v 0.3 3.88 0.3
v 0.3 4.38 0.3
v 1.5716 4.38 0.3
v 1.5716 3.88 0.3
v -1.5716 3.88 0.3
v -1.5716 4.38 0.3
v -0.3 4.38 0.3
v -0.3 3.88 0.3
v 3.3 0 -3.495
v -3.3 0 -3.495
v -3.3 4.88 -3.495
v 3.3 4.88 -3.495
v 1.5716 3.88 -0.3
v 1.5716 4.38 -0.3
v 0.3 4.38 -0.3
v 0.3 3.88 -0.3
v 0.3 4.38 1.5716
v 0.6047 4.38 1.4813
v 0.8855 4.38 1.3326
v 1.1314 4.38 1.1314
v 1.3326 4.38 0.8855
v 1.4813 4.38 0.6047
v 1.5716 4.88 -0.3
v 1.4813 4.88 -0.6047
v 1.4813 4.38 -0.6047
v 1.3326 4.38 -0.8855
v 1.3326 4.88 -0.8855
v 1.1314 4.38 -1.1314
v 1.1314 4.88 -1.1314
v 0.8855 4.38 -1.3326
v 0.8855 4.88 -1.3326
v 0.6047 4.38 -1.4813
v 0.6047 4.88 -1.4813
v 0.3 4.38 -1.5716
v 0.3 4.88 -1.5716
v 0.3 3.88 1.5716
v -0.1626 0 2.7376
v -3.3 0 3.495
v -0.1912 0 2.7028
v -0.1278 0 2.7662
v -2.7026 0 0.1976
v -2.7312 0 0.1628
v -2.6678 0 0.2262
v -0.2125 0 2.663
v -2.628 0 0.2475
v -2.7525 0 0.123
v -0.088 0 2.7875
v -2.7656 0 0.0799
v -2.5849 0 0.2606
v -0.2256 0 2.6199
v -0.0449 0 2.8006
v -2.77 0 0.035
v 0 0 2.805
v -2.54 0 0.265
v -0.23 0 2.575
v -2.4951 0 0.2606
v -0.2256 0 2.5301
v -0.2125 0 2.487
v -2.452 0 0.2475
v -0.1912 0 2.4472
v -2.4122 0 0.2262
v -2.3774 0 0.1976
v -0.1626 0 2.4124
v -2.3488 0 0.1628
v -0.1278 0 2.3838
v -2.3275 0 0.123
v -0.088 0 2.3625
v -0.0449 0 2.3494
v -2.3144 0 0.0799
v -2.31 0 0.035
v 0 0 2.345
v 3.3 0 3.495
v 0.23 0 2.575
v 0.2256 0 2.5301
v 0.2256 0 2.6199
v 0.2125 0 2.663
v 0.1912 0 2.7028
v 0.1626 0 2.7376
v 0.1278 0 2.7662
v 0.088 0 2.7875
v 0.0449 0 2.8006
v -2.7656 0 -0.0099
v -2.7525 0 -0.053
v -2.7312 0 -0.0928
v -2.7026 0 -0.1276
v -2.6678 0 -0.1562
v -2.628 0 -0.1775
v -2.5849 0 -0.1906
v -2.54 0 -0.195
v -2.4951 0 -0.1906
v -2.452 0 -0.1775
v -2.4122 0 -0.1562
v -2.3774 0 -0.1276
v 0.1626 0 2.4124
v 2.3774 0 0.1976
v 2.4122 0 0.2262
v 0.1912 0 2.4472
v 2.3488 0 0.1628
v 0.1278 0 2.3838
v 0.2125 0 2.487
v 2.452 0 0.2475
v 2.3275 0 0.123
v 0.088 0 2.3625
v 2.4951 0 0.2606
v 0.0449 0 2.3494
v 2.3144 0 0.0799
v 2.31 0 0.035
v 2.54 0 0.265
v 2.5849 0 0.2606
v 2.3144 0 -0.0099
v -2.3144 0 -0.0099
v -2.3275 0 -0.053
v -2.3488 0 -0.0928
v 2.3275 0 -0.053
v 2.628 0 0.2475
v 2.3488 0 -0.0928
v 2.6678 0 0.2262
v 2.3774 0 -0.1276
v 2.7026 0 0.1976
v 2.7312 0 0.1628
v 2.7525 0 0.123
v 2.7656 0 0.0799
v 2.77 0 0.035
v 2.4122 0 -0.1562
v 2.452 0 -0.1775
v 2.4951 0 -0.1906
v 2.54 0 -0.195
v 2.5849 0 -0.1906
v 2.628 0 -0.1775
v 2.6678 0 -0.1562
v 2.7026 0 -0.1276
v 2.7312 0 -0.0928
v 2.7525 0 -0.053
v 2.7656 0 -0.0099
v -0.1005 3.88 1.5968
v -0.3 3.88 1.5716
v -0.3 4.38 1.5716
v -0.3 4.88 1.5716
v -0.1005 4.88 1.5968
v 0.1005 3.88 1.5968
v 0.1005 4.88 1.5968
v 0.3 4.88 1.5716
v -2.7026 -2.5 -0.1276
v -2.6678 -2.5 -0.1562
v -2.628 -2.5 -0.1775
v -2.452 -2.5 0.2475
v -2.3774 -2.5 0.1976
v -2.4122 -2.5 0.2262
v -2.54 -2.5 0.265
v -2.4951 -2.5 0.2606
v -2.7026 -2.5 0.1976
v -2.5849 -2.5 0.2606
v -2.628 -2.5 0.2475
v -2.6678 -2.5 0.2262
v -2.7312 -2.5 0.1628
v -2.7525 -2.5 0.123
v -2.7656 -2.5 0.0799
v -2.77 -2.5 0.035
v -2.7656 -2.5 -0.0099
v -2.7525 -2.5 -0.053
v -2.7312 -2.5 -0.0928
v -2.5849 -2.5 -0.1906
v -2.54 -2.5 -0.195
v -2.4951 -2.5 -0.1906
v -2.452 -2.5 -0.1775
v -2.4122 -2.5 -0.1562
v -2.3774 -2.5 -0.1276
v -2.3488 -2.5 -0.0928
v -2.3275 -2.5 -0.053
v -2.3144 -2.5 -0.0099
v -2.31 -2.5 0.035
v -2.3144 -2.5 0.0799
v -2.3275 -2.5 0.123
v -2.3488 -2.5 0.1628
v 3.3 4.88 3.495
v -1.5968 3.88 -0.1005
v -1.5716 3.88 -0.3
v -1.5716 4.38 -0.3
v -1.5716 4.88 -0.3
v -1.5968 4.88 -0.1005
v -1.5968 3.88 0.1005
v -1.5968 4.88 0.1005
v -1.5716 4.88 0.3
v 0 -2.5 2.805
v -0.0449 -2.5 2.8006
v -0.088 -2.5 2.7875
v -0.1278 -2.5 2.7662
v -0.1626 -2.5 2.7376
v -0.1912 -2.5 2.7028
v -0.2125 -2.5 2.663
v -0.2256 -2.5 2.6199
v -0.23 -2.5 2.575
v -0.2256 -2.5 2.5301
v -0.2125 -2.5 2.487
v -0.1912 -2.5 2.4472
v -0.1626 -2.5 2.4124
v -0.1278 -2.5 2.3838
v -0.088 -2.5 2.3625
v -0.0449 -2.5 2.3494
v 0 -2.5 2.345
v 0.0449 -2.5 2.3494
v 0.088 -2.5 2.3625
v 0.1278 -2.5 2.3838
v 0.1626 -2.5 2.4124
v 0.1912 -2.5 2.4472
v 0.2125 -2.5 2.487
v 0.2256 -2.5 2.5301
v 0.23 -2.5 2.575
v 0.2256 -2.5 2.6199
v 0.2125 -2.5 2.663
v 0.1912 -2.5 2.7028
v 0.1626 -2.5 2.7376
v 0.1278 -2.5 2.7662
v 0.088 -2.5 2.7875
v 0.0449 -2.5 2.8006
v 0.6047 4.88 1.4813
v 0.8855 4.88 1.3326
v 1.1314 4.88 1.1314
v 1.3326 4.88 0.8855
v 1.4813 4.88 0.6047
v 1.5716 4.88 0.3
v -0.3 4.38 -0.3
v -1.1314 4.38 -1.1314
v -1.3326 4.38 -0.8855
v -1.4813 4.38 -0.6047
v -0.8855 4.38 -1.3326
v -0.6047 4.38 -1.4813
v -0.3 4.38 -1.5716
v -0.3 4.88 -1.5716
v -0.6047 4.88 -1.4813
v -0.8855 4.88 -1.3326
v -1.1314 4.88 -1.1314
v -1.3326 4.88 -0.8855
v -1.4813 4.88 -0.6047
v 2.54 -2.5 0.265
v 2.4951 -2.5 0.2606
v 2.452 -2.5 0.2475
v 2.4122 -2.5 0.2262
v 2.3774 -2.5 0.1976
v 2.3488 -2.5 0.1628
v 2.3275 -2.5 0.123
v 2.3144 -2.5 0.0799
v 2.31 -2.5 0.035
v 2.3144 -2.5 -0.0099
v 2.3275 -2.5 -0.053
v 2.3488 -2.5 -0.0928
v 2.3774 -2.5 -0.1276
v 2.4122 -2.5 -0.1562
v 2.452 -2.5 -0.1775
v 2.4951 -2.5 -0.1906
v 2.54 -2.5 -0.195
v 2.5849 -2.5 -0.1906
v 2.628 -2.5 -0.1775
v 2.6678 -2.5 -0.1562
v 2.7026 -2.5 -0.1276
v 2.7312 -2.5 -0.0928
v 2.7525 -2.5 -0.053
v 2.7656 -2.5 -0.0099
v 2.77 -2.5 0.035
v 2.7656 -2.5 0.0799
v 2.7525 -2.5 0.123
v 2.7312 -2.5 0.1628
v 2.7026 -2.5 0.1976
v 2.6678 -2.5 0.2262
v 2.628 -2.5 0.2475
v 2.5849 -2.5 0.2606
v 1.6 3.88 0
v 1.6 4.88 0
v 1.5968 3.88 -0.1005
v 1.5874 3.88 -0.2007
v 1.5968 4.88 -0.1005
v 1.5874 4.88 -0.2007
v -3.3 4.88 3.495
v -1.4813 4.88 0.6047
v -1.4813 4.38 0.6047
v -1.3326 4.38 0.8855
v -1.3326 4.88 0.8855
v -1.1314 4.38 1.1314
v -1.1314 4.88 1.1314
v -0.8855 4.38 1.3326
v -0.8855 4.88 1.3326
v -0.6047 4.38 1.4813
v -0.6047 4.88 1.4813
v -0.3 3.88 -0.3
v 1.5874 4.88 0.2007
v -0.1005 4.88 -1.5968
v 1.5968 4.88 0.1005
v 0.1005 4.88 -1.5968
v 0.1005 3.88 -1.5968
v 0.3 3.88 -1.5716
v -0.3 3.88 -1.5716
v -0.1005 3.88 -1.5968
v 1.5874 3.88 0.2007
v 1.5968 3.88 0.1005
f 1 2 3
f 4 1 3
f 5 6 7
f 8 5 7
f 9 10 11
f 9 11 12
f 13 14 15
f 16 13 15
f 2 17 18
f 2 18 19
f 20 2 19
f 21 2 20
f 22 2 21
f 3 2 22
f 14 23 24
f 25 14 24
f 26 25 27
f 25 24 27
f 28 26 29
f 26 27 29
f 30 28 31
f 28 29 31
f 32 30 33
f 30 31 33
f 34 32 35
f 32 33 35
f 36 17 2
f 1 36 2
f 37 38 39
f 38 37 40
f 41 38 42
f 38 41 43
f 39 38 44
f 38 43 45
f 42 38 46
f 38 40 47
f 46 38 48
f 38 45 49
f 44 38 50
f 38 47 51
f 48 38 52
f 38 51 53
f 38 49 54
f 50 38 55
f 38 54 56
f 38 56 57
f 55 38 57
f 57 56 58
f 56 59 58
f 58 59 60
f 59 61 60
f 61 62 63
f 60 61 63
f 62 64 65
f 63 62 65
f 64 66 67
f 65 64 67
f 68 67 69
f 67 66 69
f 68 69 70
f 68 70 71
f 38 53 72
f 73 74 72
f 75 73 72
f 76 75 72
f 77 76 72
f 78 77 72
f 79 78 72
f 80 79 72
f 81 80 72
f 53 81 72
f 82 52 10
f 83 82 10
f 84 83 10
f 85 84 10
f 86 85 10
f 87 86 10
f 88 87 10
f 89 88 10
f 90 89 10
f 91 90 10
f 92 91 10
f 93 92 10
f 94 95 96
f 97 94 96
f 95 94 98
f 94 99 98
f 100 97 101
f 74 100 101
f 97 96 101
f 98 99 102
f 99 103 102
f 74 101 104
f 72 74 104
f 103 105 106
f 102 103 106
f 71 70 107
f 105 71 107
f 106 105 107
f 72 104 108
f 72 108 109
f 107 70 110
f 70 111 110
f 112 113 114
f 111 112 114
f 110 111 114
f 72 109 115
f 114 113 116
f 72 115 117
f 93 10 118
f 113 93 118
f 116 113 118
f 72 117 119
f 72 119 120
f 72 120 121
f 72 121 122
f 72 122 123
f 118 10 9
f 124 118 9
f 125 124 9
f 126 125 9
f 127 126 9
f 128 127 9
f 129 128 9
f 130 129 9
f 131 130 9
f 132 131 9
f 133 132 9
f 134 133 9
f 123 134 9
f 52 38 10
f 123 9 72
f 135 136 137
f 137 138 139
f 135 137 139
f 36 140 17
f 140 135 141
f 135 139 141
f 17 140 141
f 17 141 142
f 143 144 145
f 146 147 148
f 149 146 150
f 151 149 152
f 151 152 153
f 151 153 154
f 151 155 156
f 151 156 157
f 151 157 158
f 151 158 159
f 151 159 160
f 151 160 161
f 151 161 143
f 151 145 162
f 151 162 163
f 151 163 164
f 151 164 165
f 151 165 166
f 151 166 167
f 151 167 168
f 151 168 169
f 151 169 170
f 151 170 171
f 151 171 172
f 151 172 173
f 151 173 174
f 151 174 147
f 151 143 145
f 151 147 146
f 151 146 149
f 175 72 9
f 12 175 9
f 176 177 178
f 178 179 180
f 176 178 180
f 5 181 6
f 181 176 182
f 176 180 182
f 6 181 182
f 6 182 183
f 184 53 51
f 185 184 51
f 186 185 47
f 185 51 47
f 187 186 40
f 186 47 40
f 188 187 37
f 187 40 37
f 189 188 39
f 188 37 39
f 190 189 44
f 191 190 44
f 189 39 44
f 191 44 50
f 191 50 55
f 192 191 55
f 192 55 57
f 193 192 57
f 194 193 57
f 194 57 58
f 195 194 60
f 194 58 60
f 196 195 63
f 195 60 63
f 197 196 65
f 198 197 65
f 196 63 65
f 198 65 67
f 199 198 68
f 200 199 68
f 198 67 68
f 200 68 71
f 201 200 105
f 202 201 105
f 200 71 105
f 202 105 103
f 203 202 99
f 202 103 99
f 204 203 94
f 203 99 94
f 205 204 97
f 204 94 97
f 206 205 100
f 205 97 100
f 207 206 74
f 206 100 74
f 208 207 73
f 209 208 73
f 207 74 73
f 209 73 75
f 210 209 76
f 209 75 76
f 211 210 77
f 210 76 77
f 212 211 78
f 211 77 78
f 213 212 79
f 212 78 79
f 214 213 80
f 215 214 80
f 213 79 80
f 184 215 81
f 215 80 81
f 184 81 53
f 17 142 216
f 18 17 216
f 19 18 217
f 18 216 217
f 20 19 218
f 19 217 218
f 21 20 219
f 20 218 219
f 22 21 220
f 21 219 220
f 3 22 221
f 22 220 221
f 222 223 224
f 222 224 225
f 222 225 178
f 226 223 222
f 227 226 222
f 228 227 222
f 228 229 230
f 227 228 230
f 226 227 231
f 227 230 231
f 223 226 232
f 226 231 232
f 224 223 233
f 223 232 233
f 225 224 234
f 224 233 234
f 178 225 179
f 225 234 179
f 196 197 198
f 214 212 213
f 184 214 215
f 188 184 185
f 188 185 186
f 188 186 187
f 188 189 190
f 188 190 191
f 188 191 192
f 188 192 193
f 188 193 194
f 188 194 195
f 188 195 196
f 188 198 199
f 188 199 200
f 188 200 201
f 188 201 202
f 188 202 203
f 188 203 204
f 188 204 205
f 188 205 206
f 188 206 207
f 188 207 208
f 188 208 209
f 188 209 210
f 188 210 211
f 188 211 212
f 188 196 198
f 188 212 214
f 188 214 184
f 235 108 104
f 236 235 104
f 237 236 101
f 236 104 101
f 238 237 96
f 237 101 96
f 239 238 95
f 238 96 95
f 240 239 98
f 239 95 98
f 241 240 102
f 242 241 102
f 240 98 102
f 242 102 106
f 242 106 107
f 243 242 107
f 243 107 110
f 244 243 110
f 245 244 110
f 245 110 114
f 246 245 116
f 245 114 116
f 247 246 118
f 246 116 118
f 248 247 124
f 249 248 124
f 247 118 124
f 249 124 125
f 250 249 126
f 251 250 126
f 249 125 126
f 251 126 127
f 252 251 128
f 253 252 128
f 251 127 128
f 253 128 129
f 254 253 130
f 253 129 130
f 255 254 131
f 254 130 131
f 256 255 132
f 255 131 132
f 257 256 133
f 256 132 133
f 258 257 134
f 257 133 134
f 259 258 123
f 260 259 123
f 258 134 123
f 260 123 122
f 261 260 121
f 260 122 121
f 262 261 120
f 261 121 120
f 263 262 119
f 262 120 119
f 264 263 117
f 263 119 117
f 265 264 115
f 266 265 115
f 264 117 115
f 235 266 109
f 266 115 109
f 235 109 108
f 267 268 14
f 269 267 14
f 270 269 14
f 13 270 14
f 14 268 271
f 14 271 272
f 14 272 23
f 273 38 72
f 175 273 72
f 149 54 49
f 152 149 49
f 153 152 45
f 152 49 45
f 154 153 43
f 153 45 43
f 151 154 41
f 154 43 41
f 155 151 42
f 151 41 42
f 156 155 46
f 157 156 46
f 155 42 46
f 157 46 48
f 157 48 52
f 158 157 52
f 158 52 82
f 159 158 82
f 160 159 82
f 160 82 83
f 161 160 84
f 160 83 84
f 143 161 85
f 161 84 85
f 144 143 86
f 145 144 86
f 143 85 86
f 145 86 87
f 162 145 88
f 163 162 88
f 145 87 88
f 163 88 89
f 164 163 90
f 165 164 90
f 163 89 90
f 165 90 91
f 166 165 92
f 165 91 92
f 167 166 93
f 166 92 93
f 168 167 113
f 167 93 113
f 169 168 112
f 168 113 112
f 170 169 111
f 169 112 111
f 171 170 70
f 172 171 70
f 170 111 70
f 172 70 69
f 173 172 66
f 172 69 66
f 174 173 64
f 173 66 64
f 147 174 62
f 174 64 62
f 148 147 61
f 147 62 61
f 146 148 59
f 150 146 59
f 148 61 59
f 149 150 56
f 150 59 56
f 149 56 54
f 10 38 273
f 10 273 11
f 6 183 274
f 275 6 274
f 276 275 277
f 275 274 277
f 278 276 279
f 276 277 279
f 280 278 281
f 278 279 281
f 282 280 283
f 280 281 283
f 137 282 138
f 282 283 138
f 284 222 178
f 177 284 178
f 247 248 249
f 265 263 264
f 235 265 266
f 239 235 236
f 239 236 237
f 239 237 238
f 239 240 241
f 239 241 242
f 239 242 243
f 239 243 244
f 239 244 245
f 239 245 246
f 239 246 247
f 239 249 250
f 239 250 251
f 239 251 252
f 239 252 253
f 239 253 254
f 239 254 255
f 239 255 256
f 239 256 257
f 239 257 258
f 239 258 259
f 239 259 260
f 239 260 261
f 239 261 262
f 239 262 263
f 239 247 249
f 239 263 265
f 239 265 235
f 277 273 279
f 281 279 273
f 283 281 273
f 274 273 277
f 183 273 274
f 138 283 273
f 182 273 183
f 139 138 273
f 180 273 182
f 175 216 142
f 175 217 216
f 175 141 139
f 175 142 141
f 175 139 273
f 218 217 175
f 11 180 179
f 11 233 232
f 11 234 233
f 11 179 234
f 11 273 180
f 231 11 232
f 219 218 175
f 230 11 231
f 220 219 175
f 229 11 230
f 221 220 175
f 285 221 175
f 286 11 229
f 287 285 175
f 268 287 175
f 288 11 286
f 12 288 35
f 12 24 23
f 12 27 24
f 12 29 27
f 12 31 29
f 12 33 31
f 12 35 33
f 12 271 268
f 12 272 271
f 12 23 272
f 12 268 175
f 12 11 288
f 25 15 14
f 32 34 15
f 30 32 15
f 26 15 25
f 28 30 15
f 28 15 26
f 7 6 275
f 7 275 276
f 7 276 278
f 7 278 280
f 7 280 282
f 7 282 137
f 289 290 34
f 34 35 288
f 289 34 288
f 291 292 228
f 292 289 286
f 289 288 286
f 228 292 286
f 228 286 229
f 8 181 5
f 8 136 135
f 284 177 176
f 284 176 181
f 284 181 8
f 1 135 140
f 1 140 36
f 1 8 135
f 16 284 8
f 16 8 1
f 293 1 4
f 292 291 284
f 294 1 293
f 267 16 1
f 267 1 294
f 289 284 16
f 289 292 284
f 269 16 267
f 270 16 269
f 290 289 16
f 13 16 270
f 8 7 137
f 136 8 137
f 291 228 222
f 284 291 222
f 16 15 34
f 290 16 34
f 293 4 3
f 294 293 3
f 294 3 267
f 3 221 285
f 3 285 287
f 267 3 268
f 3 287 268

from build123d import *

# Parameters (mm, degrees)
SKETCH_1_W          = 6.6
SKETCH_1_H          = 6.99
SKETCH_1_R          = 1.6
EXTRUDE_1_DEPTH     = 4.88
CUT_EXTRUDE_START   = 4.88
CUT_EXTRUDE_1_DEPTH = 1
CUT_EXTRUDE_2_DEPTH = 0.5
SKETCH_2_R          = 0.23
EXTRUDE_2_DEPTH     = 2.5


with BuildPart() as part:
    # Эскиз1 → Бобышка-Вытянуть1 (new body)
    # profile 1 of 6: a face of its own
    with BuildSketch(Plane(origin=(0, 0, 0), x_dir=(1, 0, 0), z_dir=(0, 1, 0))):
        Rectangle(SKETCH_1_W, SKETCH_1_H)
        Circle(SKETCH_1_R, mode=Mode.SUBTRACT)
    # profile 2 of 6: a face of its own
    with BuildSketch(Plane(origin=(0, 0, 0), x_dir=(1, 0, 0), z_dir=(0, 1, 0))):
        with BuildLine():
            ThreePointArc((0.3, 1.571623365), (0, 1.6), (-0.3, 1.571623365))
            Line((-0.3, 1.571623365), (-0.3, 0.3))
            Line((-0.3, 0.3), (-1.571623365, 0.3))
            ThreePointArc((-1.571623365, 0.3), (-1.6, 0), (-1.571623365, -0.3))
            Line((-1.571623365, -0.3), (-0.3, -0.3))
            Line((-0.3, -0.3), (-0.3, -1.571623365))
            ThreePointArc((-0.3, -1.571623365), (0, -1.6), (0.3, -1.571623365))
            Line((0.3, -1.571623365), (0.3, -0.3))
            Line((0.3, -0.3), (1.571623365, -0.3))
            ThreePointArc((1.571623365, -0.3), (1.592890044, -0.150669534), (1.6, 0))
            ThreePointArc((1.6, 0), (1.592890044, 0.150669534), (1.571623365, 0.3))
            Line((1.571623365, 0.3), (0.3, 0.3))
            Line((0.3, 0.3), (0.3, 1.571623365))
        make_face()
    # profile 3 of 6: a face of its own
    with BuildSketch(Plane(origin=(0, 0, 0), x_dir=(1, 0, 0), z_dir=(0, 1, 0))):
        with BuildLine():
            ThreePointArc((0.3, -1.571623365), (1.13137085, -1.13137085), (1.571623365, -0.3))
            Line((1.571623365, -0.3), (0.3, -0.3))
            Line((0.3, -0.3), (0.3, -1.571623365))
        make_face()
    # profile 4 of 6: a face of its own
    with BuildSketch(Plane(origin=(0, 0, 0), x_dir=(1, 0, 0), z_dir=(0, 1, 0))):
        with BuildLine():
            Line((-0.3, -0.3), (-1.571623365, -0.3))
            ThreePointArc((-1.571623365, -0.3), (-1.13137085, -1.13137085), (-0.3, -1.571623365))
            Line((-0.3, -1.571623365), (-0.3, -0.3))
        make_face()
    # profile 5 of 6: a face of its own
    with BuildSketch(Plane(origin=(0, 0, 0), x_dir=(1, 0, 0), z_dir=(0, 1, 0))):
        with BuildLine():
            Line((-0.3, 0.3), (-0.3, 1.571623365))
            ThreePointArc((-0.3, 1.571623365), (-1.13137085, 1.13137085), (-1.571623365, 0.3))
            Line((-1.571623365, 0.3), (-0.3, 0.3))
        make_face()
    # profile 6 of 6: a face of its own
    with BuildSketch(Plane(origin=(0, 0, 0), x_dir=(1, 0, 0), z_dir=(0, 1, 0))):
        with BuildLine():
            ThreePointArc((1.571623365, 0.3), (1.13137085, 1.13137085), (0.3, 1.571623365))
            Line((0.3, 1.571623365), (0.3, 0.3))
            Line((0.3, 0.3), (1.571623365, 0.3))
        make_face()
    extrude(amount=EXTRUDE_1_DEPTH)

    # Эскиз1<3> → Вырез-Вытянуть1 (cut)
    with BuildSketch(Plane(origin=(0, 0, 0), x_dir=(1, 0, 0), z_dir=(0, 1, 0)).offset(CUT_EXTRUDE_START)):
        with BuildLine():
            ThreePointArc((0.3, 1.571623365), (0, 1.6), (-0.3, 1.571623365))
            Line((-0.3, 1.571623365), (-0.3, 0.3))
            Line((-0.3, 0.3), (-1.571623365, 0.3))
            ThreePointArc((-1.571623365, 0.3), (-1.6, 0), (-1.571623365, -0.3))
            Line((-1.571623365, -0.3), (-0.3, -0.3))
            Line((-0.3, -0.3), (-0.3, -1.571623365))
            ThreePointArc((-0.3, -1.571623365), (0, -1.6), (0.3, -1.571623365))
            Line((0.3, -1.571623365), (0.3, -0.3))
            Line((0.3, -0.3), (1.571623365, -0.3))
            ThreePointArc((1.571623365, -0.3), (1.592890044, -0.150669534), (1.6, 0))
            ThreePointArc((1.6, 0), (1.592890044, 0.150669534), (1.571623365, 0.3))
            Line((1.571623365, 0.3), (0.3, 0.3))
            Line((0.3, 0.3), (0.3, 1.571623365))
        make_face()
    extrude(amount=-CUT_EXTRUDE_1_DEPTH, mode=Mode.SUBTRACT)

    # Эскиз1<4> → Вырез-Вытянуть2 (cut)
    with BuildSketch(Plane(origin=(0, 0, 0), x_dir=(1, 0, 0), z_dir=(0, 1, 0)).offset(CUT_EXTRUDE_START)):
        with BuildLine():
            Line((-0.3, -0.3), (-1.571623365, -0.3))
            ThreePointArc((-1.571623365, -0.3), (-1.13137085, -1.13137085), (-0.3, -1.571623365))
            Line((-0.3, -1.571623365), (-0.3, -0.3))
        make_face()
        with BuildLine():
            Line((-0.3, 0.3), (-0.3, 1.571623365))
            ThreePointArc((-0.3, 1.571623365), (-1.13137085, 1.13137085), (-1.571623365, 0.3))
            Line((-1.571623365, 0.3), (-0.3, 0.3))
        make_face()
        with BuildLine():
            ThreePointArc((1.571623365, 0.3), (1.13137085, 1.13137085), (0.3, 1.571623365))
            Line((0.3, 1.571623365), (0.3, 0.3))
            Line((0.3, 0.3), (1.571623365, 0.3))
        make_face()
        with BuildLine():
            ThreePointArc((0.3, -1.571623365), (1.13137085, -1.13137085), (1.571623365, -0.3))
            Line((1.571623365, -0.3), (0.3, -0.3))
            Line((0.3, -0.3), (0.3, -1.571623365))
        make_face()
    extrude(amount=-CUT_EXTRUDE_2_DEPTH, mode=Mode.SUBTRACT)

    # Эскиз2 → Бобышка-Вытянуть2 (add)
    with BuildSketch(Plane.XZ):
        with Locations(Location((0, 2.575, 0), (0, 0, 90))):
            Circle(SKETCH_2_R)
        with Locations(Location((2.54, 0.035, 0), (0, 0, 90))):
            Circle(SKETCH_2_R)
        with Locations(Location((-2.54, 0.035, 0), (0, 0, 90))):
            Circle(SKETCH_2_R)
    extrude(amount=EXTRUDE_2_DEPTH)


solid = part.part
